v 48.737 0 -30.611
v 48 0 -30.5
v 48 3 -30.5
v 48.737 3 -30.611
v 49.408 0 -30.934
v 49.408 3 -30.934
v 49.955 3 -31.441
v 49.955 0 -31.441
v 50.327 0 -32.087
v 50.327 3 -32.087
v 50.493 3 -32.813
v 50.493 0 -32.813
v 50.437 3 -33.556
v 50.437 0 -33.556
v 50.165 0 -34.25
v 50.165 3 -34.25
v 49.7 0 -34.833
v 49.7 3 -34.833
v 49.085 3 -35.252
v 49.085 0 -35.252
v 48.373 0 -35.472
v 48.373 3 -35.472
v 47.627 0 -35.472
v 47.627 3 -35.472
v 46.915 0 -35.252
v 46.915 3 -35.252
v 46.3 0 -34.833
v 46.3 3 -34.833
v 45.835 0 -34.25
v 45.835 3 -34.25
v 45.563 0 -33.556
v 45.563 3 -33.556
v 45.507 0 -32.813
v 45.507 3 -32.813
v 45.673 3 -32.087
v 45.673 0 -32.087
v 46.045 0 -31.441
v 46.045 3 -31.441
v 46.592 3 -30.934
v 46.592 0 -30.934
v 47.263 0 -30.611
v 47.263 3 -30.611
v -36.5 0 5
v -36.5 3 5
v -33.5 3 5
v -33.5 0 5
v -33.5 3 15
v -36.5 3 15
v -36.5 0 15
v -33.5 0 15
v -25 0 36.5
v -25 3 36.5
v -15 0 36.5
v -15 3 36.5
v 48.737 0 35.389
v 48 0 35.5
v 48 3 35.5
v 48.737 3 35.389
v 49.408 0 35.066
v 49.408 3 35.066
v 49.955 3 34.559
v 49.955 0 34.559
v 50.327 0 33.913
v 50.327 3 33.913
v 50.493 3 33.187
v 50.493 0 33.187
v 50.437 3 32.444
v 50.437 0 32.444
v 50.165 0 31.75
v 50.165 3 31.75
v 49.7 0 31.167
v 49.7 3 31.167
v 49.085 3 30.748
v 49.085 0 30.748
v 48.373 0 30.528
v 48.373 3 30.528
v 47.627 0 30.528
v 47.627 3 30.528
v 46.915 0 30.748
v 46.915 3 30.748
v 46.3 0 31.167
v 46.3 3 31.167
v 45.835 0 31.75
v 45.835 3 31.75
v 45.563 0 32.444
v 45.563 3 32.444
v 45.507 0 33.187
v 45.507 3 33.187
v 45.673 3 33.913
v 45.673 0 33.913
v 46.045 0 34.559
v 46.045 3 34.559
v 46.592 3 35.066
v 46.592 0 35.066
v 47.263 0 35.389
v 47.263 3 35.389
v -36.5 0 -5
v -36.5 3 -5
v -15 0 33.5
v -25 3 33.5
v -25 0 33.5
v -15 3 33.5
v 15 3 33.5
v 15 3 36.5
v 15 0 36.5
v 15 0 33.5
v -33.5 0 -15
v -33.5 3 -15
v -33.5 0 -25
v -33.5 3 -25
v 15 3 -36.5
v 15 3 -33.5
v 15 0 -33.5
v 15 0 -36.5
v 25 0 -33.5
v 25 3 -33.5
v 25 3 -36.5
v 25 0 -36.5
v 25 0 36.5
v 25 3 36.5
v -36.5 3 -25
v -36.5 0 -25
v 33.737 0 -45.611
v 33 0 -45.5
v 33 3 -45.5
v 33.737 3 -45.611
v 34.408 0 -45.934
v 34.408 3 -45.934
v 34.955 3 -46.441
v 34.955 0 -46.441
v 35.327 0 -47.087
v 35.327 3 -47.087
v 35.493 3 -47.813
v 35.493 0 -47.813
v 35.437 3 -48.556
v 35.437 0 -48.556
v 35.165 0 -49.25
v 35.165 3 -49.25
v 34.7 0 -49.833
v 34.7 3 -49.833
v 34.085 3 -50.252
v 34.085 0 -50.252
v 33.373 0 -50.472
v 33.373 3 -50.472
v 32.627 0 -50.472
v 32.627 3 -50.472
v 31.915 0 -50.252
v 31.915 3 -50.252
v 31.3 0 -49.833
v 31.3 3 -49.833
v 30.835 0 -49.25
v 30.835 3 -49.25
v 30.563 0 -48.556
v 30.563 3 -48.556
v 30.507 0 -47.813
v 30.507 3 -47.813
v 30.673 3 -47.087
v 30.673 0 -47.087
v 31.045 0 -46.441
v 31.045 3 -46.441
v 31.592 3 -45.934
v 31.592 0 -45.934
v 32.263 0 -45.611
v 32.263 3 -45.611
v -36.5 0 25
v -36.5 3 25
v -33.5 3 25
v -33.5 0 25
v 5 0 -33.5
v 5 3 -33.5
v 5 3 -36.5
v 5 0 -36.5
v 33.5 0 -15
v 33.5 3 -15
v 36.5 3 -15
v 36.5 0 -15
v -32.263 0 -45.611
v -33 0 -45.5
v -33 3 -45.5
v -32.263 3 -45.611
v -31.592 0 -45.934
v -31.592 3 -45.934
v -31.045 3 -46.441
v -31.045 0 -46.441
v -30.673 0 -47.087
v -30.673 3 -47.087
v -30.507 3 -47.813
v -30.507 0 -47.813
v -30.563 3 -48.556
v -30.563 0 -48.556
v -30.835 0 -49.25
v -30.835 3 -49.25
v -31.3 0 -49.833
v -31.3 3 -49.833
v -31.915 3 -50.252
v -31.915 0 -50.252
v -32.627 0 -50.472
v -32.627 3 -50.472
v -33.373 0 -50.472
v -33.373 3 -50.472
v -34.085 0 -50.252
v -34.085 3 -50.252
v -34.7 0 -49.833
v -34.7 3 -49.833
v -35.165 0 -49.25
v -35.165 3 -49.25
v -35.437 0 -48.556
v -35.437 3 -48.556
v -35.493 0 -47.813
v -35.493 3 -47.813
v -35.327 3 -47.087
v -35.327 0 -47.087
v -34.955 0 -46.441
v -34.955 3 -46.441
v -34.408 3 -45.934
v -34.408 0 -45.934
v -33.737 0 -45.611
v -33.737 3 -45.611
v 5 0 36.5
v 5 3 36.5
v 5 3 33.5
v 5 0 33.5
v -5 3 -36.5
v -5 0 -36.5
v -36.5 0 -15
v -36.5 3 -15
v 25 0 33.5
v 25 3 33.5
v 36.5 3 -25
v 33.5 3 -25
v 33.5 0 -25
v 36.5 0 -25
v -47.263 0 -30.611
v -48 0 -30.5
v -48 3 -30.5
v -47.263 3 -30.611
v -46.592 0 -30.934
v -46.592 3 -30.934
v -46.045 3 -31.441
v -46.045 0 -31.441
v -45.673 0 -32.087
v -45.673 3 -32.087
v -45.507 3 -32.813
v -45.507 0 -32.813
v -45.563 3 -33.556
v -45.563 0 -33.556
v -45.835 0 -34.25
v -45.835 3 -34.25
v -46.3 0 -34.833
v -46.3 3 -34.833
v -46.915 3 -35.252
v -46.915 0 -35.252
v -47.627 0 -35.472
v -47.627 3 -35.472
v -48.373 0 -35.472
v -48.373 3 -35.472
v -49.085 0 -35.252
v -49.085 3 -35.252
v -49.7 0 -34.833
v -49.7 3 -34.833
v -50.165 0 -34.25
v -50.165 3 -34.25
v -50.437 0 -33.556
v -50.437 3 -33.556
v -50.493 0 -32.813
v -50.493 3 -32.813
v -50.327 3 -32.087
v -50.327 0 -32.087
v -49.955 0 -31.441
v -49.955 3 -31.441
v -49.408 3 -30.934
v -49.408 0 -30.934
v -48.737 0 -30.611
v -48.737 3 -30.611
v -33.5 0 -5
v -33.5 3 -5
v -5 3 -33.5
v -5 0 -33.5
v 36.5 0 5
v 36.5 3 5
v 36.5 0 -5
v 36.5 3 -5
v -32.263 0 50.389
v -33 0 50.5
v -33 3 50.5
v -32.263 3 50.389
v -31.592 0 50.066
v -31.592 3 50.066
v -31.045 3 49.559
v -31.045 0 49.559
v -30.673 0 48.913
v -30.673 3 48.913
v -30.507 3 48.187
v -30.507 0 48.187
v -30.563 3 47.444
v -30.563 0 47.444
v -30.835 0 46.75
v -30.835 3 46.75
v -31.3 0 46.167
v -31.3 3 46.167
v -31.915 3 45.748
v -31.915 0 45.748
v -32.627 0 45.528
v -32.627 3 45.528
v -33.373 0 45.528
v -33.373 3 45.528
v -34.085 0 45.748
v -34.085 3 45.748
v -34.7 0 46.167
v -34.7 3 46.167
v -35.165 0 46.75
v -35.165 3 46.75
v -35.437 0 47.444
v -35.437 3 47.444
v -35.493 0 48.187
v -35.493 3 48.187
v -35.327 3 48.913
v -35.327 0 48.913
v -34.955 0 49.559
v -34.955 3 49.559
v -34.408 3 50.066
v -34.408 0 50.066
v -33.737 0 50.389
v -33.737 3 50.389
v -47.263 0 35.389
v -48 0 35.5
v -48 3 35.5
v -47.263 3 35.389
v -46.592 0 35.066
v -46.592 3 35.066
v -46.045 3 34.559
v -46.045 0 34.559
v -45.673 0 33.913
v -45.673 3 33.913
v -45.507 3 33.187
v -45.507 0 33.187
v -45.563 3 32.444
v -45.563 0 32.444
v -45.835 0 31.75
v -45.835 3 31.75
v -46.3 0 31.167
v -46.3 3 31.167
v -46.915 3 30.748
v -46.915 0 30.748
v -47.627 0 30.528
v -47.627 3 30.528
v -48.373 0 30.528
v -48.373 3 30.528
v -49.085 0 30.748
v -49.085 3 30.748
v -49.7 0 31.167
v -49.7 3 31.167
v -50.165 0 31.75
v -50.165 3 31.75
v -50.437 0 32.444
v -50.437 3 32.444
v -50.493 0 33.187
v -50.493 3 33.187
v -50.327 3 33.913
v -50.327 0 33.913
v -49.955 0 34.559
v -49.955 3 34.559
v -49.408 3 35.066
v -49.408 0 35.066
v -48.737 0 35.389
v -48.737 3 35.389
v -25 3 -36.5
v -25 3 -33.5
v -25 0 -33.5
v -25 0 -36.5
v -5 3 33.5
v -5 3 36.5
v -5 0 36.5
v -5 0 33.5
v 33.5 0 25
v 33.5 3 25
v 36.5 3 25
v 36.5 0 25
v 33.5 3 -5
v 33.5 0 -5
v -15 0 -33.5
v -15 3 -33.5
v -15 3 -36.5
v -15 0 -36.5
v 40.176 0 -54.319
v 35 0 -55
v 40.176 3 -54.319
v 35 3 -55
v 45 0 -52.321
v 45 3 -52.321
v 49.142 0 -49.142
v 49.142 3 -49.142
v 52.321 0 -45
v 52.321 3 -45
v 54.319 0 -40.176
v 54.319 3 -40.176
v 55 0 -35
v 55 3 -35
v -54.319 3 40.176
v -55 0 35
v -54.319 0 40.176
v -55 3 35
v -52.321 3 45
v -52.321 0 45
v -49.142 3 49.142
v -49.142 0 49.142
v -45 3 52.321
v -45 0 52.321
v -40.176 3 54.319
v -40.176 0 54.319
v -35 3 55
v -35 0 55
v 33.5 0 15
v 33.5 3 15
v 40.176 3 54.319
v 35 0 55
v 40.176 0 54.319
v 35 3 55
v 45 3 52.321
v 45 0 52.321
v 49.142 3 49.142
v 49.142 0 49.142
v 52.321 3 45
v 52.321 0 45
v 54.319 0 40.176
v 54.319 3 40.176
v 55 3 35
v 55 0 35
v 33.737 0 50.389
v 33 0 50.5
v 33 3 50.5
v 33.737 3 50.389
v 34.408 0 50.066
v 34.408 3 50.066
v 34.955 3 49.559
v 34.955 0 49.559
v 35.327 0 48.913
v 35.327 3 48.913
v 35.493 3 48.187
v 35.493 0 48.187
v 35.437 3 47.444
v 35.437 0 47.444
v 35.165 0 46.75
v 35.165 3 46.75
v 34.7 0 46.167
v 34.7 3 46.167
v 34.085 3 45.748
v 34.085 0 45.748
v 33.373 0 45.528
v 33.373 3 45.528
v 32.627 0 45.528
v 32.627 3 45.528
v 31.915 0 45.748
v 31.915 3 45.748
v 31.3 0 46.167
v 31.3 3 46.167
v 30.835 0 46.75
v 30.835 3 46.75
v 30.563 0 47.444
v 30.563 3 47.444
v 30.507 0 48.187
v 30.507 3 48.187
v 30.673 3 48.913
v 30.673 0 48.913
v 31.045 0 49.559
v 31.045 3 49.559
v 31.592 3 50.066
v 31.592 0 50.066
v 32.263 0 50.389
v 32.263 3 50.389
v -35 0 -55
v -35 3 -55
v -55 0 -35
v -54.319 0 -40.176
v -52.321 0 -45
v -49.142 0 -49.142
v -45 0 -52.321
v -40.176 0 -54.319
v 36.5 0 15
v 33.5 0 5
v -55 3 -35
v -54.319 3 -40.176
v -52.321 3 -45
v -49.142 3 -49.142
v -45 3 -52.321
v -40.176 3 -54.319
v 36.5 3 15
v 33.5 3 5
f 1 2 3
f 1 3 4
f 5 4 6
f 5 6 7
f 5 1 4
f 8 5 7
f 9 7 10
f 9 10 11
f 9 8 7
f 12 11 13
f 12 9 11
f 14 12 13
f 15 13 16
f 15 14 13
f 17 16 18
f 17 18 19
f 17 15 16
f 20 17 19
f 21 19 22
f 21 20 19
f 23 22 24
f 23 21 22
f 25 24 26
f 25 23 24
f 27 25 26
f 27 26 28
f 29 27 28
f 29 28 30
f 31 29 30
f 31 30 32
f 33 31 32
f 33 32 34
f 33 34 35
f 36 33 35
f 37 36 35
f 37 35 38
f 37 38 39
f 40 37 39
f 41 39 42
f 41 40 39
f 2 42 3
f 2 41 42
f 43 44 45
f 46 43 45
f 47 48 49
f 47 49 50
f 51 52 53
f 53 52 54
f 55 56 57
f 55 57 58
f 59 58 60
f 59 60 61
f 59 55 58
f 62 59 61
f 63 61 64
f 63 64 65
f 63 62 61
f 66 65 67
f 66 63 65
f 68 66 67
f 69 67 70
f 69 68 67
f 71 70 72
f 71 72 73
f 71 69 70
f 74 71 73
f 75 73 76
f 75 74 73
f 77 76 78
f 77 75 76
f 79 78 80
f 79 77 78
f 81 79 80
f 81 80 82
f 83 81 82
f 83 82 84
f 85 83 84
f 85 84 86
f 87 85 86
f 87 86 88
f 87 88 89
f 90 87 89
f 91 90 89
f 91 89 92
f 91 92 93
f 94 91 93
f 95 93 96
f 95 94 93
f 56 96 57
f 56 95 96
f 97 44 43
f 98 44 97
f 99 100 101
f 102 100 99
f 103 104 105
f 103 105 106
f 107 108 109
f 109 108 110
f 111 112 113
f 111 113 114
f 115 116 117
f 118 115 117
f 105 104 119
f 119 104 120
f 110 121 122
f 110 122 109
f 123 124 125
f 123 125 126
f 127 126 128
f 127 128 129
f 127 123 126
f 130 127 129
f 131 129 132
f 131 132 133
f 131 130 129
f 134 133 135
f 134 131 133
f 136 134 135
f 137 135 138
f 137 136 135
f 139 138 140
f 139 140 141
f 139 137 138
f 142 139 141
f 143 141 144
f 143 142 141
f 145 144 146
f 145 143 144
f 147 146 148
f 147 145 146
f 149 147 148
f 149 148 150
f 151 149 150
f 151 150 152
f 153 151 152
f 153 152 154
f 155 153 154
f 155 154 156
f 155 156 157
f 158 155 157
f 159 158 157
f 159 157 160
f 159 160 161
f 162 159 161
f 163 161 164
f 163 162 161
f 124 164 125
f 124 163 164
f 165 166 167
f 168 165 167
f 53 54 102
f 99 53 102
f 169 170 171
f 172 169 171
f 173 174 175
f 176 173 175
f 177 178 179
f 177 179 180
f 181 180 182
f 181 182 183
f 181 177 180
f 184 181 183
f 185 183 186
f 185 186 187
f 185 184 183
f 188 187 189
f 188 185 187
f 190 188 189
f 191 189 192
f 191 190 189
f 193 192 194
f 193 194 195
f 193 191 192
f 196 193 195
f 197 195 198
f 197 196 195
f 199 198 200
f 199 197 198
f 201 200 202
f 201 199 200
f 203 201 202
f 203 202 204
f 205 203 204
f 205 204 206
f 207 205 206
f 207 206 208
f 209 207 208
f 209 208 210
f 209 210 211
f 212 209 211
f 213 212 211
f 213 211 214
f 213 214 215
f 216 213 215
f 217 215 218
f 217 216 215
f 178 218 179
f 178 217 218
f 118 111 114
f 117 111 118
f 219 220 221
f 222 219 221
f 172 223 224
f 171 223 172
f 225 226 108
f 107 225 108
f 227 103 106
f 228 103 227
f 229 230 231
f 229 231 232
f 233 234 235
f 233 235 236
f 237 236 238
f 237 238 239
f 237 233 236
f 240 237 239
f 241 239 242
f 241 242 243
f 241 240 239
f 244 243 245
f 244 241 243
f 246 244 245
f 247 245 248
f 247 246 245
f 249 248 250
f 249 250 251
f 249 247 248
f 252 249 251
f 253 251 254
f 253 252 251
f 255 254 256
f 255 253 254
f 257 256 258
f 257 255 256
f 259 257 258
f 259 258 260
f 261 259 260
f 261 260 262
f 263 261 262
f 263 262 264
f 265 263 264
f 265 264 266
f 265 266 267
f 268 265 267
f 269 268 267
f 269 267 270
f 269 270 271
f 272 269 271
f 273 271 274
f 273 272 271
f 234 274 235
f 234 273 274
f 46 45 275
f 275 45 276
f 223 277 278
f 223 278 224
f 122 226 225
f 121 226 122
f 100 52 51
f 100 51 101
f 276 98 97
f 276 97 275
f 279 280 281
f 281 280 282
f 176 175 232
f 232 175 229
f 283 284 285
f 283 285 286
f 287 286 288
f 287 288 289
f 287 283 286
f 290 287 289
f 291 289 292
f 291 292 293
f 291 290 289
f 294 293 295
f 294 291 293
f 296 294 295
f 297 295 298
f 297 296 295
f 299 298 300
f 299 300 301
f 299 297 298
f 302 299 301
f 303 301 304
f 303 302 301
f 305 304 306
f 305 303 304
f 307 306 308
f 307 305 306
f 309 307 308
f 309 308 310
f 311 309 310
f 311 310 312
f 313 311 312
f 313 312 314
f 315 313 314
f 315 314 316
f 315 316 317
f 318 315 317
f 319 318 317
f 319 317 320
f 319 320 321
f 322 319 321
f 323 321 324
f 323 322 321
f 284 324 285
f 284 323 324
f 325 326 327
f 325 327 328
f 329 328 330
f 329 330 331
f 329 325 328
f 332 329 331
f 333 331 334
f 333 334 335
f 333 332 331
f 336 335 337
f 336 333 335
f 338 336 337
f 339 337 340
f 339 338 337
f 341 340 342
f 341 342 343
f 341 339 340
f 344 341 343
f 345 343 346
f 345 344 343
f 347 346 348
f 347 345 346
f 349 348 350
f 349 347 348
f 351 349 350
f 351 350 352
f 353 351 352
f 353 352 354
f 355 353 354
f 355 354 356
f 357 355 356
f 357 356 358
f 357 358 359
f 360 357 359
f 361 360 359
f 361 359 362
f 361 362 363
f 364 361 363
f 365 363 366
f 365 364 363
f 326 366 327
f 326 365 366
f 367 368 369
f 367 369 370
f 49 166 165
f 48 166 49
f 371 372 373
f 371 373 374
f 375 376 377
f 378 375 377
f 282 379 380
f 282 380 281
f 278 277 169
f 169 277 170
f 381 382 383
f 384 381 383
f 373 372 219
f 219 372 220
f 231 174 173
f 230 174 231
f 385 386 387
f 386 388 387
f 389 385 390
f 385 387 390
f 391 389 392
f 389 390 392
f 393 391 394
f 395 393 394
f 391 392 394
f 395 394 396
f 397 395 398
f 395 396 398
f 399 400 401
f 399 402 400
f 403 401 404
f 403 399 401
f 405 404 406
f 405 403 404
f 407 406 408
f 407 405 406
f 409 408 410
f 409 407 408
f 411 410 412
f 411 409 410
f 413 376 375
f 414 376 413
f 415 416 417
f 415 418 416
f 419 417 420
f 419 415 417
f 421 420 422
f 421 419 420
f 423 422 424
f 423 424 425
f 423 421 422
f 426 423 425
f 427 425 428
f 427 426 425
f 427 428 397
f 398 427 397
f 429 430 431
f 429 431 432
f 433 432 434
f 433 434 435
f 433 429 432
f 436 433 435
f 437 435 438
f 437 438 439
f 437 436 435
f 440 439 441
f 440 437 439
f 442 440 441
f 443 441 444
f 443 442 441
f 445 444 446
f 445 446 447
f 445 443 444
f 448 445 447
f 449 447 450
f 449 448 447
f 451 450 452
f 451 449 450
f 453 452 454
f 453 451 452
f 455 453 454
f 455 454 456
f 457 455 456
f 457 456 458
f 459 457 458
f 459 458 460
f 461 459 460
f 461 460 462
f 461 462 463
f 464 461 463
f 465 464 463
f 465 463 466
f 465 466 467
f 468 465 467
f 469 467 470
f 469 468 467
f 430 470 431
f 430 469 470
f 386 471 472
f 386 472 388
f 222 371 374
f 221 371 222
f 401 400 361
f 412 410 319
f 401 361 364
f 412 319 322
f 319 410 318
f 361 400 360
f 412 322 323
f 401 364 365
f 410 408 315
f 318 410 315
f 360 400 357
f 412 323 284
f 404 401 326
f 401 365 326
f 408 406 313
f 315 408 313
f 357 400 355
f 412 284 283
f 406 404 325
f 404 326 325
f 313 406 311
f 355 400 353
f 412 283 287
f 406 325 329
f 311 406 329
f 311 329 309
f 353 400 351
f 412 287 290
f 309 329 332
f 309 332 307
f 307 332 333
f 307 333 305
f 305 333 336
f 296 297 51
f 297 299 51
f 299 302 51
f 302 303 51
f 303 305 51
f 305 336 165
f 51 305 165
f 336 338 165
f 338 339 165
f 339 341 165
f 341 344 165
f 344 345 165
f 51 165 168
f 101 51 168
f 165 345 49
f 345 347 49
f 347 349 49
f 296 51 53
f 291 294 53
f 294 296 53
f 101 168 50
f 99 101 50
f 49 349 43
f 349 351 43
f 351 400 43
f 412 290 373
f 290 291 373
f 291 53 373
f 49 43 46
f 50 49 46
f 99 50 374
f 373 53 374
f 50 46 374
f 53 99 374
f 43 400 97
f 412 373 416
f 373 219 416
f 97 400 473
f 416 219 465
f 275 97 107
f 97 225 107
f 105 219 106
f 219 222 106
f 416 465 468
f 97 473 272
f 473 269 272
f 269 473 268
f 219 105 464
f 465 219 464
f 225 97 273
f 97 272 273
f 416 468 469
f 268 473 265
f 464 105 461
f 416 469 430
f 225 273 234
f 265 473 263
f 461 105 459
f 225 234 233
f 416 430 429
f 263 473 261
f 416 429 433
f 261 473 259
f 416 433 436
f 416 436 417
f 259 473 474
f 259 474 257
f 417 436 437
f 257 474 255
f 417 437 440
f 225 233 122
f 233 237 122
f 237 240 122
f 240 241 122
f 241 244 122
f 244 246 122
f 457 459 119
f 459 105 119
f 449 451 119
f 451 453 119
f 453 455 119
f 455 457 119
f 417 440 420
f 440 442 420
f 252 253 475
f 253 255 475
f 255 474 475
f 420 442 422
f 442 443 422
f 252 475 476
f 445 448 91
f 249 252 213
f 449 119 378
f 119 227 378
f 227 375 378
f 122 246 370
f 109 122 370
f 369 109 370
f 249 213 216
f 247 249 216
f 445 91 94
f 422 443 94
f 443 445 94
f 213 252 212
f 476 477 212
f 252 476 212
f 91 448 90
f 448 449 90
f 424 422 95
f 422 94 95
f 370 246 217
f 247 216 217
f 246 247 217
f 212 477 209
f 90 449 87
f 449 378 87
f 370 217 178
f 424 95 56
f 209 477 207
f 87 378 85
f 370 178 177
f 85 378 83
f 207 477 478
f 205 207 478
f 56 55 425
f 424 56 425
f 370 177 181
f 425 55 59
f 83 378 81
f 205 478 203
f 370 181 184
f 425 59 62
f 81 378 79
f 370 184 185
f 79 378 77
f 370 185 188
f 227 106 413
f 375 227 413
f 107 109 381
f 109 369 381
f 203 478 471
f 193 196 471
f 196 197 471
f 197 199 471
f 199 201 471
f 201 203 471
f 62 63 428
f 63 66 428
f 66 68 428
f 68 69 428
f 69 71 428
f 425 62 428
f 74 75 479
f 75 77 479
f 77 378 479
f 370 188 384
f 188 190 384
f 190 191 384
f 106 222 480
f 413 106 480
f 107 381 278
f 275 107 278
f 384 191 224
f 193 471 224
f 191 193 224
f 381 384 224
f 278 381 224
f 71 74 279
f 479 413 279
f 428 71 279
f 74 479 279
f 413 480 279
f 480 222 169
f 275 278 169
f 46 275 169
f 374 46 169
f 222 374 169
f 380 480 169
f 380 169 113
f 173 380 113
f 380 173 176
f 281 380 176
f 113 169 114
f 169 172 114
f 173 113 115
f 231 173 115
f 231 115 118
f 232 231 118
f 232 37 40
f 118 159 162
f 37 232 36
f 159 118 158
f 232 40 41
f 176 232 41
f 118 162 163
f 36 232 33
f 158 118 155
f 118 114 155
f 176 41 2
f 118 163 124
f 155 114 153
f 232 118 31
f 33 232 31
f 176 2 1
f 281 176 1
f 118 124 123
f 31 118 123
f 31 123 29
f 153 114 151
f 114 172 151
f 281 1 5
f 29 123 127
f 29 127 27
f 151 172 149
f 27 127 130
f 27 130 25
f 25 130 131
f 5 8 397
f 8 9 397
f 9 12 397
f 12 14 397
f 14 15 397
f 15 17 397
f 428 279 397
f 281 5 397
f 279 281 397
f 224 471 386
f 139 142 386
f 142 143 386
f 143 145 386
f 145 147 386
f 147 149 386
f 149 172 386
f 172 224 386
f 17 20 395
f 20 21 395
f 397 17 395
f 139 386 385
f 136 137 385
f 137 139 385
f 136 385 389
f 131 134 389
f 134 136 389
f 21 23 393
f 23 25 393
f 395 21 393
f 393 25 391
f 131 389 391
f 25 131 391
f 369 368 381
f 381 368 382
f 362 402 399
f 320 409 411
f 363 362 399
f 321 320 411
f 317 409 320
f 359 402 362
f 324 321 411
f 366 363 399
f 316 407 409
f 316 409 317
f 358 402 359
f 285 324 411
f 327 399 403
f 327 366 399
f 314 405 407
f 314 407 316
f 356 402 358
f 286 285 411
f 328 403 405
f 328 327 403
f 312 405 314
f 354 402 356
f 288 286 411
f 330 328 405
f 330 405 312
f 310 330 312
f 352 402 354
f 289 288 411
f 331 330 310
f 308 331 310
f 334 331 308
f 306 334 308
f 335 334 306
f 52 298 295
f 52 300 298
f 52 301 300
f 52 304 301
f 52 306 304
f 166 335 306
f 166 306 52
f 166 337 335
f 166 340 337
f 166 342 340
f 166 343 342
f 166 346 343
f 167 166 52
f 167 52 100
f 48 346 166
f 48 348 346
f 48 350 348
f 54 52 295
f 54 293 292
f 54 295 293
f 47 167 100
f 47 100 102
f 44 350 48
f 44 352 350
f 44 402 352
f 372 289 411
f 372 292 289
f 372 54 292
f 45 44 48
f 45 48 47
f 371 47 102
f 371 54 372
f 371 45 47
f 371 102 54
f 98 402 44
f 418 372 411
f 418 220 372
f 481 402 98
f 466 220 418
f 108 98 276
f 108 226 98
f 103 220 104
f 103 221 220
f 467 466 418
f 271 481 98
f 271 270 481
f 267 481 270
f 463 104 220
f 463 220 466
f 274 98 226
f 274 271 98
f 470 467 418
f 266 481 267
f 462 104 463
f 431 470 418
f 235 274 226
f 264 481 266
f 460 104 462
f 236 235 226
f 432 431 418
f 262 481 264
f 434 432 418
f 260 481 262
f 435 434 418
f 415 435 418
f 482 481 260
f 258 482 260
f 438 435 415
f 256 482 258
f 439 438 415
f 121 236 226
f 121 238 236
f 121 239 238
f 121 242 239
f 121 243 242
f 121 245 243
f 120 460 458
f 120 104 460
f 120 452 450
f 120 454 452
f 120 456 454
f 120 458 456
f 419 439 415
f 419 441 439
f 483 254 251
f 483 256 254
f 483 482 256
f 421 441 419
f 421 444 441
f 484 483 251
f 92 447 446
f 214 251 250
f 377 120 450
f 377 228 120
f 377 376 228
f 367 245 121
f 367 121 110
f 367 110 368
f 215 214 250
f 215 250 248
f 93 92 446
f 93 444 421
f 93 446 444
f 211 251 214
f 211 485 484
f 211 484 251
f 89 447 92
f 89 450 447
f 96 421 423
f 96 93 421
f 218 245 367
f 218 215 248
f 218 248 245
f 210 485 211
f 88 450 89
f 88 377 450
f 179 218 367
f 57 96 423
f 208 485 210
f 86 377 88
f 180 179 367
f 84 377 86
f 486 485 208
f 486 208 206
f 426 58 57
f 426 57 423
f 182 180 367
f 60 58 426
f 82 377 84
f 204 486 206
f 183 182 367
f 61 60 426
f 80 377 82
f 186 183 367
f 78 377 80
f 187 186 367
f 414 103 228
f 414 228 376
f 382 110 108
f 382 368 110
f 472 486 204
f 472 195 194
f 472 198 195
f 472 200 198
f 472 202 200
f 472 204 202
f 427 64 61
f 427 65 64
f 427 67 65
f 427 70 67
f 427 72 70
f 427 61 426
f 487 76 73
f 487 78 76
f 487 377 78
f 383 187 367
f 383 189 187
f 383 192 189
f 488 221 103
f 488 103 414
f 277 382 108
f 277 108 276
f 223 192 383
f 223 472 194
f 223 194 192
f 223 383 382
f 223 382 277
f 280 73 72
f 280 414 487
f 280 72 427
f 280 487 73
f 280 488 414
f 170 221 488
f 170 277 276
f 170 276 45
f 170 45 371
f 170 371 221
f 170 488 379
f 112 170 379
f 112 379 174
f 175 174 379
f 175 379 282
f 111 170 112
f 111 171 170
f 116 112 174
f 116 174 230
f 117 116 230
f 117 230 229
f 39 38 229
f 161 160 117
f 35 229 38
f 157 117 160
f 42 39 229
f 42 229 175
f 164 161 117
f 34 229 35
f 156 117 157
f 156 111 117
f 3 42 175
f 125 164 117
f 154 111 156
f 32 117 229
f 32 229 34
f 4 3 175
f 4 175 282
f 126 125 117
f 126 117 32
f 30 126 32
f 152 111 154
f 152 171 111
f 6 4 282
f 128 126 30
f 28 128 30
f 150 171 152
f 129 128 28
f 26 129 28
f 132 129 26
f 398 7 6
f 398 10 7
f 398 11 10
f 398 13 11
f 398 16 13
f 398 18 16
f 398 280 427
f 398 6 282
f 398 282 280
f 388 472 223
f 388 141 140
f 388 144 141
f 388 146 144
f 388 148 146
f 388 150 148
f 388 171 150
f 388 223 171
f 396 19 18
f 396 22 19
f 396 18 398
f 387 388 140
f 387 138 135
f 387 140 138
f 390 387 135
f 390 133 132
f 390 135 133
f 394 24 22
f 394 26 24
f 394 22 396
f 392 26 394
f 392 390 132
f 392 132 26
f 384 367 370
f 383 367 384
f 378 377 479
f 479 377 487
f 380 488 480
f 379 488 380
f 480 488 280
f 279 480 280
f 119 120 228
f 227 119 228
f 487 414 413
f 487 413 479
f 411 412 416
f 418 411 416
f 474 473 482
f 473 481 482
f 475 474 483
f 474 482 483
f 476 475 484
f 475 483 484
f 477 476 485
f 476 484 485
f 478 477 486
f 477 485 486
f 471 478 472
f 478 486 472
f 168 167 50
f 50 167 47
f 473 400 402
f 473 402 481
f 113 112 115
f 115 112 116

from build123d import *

# Parameters (mm, degrees)
SKETCH1_W           = 110
SKETCH1_H           = 110
SKETCH1_R           = 2.5
BOSS_EXTRUDE1_DEPTH = 3
FILLET1_R           = 20
SKETCH2_W           = 3
SKETCH2_H           = 10
SKETCH2_W_2         = 10
SKETCH2_H_2         = 3
CUT_EXTRUDE1_DEPTH  = 78.839578622


with BuildPart() as part:
    # Sketch1 → Boss-Extrude1 (new body)
    with BuildSketch(Plane(origin=(0, 0, 0), x_dir=(1, 0, 0), z_dir=(0, 1, 0))):
        Rectangle(SKETCH1_W, SKETCH1_H)
        with Locations(Location((33, 48, 0), (0, 0, 270))):
            Circle(SKETCH1_R, mode=Mode.SUBTRACT)
        with Locations(Location((-33, 48, 0), (0, 0, 270))):
            Circle(SKETCH1_R, mode=Mode.SUBTRACT)
        with Locations(Location((48, 33, 0), (0, 0, 270))):
            Circle(SKETCH1_R, mode=Mode.SUBTRACT)
        with Locations(Location((48, -33, 0), (0, 0, 270))):
            Circle(SKETCH1_R, mode=Mode.SUBTRACT)
        with Locations(Location((33, -48, 0), (0, 0, 270))):
            Circle(SKETCH1_R, mode=Mode.SUBTRACT)
        with Locations(Location((-33, -48, 0), (0, 0, 270))):
            Circle(SKETCH1_R, mode=Mode.SUBTRACT)
        with Locations(Location((-48, -33, 0), (0, 0, 270))):
            Circle(SKETCH1_R, mode=Mode.SUBTRACT)
        with Locations(Location((-48, 33, 0), (0, 0, 270))):
            Circle(SKETCH1_R, mode=Mode.SUBTRACT)
    extrude(amount=BOSS_EXTRUDE1_DEPTH)

    # Fillet1
    fillet1_edges = [part.edges().sort_by_distance(p)[0] for p in [
        (55, 1.5, 55),
        (-55, 1.5, 55),
        (-55, 1.5, -55),
        (55, 1.5, -55),
    ]]
    fillet(fillet1_edges, radius=FILLET1_R)

    # Sketch2 → Cut-Extrude1 (cut, through all)
    with BuildSketch(Plane(origin=(0, 3, 0), x_dir=(1, 0, 0), z_dir=(0, 1, 0))):
        with Locations((-35, -20)):
            Rectangle(SKETCH2_W, SKETCH2_H)
        with Locations((-35, 0)):
            Rectangle(SKETCH2_W, SKETCH2_H)
        with Locations((-20, 35)):
            Rectangle(SKETCH2_W_2, SKETCH2_H_2)
        with Locations((0, 35)):
            Rectangle(SKETCH2_W_2, SKETCH2_H_2)
        with Locations((20, 35)):
            Rectangle(SKETCH2_W_2, SKETCH2_H_2)
        with Locations((35, 20)):
            Rectangle(SKETCH2_W, SKETCH2_H)
        with Locations((35, 0)):
            Rectangle(SKETCH2_W, SKETCH2_H)
        with Locations((35, -20)):
            Rectangle(SKETCH2_W, SKETCH2_H)
        with Locations((20, -35)):
            Rectangle(SKETCH2_W_2, SKETCH2_H_2)
        with Locations((0, -35)):
            Rectangle(SKETCH2_W_2, SKETCH2_H_2)
        with Locations((-20, -35)):
            Rectangle(SKETCH2_W_2, SKETCH2_H_2)
        with Locations((-35, 20)):
            Rectangle(SKETCH2_W, SKETCH2_H)
    extrude(amount=-CUT_EXTRUDE1_DEPTH, mode=Mode.SUBTRACT)


solid = part.part
